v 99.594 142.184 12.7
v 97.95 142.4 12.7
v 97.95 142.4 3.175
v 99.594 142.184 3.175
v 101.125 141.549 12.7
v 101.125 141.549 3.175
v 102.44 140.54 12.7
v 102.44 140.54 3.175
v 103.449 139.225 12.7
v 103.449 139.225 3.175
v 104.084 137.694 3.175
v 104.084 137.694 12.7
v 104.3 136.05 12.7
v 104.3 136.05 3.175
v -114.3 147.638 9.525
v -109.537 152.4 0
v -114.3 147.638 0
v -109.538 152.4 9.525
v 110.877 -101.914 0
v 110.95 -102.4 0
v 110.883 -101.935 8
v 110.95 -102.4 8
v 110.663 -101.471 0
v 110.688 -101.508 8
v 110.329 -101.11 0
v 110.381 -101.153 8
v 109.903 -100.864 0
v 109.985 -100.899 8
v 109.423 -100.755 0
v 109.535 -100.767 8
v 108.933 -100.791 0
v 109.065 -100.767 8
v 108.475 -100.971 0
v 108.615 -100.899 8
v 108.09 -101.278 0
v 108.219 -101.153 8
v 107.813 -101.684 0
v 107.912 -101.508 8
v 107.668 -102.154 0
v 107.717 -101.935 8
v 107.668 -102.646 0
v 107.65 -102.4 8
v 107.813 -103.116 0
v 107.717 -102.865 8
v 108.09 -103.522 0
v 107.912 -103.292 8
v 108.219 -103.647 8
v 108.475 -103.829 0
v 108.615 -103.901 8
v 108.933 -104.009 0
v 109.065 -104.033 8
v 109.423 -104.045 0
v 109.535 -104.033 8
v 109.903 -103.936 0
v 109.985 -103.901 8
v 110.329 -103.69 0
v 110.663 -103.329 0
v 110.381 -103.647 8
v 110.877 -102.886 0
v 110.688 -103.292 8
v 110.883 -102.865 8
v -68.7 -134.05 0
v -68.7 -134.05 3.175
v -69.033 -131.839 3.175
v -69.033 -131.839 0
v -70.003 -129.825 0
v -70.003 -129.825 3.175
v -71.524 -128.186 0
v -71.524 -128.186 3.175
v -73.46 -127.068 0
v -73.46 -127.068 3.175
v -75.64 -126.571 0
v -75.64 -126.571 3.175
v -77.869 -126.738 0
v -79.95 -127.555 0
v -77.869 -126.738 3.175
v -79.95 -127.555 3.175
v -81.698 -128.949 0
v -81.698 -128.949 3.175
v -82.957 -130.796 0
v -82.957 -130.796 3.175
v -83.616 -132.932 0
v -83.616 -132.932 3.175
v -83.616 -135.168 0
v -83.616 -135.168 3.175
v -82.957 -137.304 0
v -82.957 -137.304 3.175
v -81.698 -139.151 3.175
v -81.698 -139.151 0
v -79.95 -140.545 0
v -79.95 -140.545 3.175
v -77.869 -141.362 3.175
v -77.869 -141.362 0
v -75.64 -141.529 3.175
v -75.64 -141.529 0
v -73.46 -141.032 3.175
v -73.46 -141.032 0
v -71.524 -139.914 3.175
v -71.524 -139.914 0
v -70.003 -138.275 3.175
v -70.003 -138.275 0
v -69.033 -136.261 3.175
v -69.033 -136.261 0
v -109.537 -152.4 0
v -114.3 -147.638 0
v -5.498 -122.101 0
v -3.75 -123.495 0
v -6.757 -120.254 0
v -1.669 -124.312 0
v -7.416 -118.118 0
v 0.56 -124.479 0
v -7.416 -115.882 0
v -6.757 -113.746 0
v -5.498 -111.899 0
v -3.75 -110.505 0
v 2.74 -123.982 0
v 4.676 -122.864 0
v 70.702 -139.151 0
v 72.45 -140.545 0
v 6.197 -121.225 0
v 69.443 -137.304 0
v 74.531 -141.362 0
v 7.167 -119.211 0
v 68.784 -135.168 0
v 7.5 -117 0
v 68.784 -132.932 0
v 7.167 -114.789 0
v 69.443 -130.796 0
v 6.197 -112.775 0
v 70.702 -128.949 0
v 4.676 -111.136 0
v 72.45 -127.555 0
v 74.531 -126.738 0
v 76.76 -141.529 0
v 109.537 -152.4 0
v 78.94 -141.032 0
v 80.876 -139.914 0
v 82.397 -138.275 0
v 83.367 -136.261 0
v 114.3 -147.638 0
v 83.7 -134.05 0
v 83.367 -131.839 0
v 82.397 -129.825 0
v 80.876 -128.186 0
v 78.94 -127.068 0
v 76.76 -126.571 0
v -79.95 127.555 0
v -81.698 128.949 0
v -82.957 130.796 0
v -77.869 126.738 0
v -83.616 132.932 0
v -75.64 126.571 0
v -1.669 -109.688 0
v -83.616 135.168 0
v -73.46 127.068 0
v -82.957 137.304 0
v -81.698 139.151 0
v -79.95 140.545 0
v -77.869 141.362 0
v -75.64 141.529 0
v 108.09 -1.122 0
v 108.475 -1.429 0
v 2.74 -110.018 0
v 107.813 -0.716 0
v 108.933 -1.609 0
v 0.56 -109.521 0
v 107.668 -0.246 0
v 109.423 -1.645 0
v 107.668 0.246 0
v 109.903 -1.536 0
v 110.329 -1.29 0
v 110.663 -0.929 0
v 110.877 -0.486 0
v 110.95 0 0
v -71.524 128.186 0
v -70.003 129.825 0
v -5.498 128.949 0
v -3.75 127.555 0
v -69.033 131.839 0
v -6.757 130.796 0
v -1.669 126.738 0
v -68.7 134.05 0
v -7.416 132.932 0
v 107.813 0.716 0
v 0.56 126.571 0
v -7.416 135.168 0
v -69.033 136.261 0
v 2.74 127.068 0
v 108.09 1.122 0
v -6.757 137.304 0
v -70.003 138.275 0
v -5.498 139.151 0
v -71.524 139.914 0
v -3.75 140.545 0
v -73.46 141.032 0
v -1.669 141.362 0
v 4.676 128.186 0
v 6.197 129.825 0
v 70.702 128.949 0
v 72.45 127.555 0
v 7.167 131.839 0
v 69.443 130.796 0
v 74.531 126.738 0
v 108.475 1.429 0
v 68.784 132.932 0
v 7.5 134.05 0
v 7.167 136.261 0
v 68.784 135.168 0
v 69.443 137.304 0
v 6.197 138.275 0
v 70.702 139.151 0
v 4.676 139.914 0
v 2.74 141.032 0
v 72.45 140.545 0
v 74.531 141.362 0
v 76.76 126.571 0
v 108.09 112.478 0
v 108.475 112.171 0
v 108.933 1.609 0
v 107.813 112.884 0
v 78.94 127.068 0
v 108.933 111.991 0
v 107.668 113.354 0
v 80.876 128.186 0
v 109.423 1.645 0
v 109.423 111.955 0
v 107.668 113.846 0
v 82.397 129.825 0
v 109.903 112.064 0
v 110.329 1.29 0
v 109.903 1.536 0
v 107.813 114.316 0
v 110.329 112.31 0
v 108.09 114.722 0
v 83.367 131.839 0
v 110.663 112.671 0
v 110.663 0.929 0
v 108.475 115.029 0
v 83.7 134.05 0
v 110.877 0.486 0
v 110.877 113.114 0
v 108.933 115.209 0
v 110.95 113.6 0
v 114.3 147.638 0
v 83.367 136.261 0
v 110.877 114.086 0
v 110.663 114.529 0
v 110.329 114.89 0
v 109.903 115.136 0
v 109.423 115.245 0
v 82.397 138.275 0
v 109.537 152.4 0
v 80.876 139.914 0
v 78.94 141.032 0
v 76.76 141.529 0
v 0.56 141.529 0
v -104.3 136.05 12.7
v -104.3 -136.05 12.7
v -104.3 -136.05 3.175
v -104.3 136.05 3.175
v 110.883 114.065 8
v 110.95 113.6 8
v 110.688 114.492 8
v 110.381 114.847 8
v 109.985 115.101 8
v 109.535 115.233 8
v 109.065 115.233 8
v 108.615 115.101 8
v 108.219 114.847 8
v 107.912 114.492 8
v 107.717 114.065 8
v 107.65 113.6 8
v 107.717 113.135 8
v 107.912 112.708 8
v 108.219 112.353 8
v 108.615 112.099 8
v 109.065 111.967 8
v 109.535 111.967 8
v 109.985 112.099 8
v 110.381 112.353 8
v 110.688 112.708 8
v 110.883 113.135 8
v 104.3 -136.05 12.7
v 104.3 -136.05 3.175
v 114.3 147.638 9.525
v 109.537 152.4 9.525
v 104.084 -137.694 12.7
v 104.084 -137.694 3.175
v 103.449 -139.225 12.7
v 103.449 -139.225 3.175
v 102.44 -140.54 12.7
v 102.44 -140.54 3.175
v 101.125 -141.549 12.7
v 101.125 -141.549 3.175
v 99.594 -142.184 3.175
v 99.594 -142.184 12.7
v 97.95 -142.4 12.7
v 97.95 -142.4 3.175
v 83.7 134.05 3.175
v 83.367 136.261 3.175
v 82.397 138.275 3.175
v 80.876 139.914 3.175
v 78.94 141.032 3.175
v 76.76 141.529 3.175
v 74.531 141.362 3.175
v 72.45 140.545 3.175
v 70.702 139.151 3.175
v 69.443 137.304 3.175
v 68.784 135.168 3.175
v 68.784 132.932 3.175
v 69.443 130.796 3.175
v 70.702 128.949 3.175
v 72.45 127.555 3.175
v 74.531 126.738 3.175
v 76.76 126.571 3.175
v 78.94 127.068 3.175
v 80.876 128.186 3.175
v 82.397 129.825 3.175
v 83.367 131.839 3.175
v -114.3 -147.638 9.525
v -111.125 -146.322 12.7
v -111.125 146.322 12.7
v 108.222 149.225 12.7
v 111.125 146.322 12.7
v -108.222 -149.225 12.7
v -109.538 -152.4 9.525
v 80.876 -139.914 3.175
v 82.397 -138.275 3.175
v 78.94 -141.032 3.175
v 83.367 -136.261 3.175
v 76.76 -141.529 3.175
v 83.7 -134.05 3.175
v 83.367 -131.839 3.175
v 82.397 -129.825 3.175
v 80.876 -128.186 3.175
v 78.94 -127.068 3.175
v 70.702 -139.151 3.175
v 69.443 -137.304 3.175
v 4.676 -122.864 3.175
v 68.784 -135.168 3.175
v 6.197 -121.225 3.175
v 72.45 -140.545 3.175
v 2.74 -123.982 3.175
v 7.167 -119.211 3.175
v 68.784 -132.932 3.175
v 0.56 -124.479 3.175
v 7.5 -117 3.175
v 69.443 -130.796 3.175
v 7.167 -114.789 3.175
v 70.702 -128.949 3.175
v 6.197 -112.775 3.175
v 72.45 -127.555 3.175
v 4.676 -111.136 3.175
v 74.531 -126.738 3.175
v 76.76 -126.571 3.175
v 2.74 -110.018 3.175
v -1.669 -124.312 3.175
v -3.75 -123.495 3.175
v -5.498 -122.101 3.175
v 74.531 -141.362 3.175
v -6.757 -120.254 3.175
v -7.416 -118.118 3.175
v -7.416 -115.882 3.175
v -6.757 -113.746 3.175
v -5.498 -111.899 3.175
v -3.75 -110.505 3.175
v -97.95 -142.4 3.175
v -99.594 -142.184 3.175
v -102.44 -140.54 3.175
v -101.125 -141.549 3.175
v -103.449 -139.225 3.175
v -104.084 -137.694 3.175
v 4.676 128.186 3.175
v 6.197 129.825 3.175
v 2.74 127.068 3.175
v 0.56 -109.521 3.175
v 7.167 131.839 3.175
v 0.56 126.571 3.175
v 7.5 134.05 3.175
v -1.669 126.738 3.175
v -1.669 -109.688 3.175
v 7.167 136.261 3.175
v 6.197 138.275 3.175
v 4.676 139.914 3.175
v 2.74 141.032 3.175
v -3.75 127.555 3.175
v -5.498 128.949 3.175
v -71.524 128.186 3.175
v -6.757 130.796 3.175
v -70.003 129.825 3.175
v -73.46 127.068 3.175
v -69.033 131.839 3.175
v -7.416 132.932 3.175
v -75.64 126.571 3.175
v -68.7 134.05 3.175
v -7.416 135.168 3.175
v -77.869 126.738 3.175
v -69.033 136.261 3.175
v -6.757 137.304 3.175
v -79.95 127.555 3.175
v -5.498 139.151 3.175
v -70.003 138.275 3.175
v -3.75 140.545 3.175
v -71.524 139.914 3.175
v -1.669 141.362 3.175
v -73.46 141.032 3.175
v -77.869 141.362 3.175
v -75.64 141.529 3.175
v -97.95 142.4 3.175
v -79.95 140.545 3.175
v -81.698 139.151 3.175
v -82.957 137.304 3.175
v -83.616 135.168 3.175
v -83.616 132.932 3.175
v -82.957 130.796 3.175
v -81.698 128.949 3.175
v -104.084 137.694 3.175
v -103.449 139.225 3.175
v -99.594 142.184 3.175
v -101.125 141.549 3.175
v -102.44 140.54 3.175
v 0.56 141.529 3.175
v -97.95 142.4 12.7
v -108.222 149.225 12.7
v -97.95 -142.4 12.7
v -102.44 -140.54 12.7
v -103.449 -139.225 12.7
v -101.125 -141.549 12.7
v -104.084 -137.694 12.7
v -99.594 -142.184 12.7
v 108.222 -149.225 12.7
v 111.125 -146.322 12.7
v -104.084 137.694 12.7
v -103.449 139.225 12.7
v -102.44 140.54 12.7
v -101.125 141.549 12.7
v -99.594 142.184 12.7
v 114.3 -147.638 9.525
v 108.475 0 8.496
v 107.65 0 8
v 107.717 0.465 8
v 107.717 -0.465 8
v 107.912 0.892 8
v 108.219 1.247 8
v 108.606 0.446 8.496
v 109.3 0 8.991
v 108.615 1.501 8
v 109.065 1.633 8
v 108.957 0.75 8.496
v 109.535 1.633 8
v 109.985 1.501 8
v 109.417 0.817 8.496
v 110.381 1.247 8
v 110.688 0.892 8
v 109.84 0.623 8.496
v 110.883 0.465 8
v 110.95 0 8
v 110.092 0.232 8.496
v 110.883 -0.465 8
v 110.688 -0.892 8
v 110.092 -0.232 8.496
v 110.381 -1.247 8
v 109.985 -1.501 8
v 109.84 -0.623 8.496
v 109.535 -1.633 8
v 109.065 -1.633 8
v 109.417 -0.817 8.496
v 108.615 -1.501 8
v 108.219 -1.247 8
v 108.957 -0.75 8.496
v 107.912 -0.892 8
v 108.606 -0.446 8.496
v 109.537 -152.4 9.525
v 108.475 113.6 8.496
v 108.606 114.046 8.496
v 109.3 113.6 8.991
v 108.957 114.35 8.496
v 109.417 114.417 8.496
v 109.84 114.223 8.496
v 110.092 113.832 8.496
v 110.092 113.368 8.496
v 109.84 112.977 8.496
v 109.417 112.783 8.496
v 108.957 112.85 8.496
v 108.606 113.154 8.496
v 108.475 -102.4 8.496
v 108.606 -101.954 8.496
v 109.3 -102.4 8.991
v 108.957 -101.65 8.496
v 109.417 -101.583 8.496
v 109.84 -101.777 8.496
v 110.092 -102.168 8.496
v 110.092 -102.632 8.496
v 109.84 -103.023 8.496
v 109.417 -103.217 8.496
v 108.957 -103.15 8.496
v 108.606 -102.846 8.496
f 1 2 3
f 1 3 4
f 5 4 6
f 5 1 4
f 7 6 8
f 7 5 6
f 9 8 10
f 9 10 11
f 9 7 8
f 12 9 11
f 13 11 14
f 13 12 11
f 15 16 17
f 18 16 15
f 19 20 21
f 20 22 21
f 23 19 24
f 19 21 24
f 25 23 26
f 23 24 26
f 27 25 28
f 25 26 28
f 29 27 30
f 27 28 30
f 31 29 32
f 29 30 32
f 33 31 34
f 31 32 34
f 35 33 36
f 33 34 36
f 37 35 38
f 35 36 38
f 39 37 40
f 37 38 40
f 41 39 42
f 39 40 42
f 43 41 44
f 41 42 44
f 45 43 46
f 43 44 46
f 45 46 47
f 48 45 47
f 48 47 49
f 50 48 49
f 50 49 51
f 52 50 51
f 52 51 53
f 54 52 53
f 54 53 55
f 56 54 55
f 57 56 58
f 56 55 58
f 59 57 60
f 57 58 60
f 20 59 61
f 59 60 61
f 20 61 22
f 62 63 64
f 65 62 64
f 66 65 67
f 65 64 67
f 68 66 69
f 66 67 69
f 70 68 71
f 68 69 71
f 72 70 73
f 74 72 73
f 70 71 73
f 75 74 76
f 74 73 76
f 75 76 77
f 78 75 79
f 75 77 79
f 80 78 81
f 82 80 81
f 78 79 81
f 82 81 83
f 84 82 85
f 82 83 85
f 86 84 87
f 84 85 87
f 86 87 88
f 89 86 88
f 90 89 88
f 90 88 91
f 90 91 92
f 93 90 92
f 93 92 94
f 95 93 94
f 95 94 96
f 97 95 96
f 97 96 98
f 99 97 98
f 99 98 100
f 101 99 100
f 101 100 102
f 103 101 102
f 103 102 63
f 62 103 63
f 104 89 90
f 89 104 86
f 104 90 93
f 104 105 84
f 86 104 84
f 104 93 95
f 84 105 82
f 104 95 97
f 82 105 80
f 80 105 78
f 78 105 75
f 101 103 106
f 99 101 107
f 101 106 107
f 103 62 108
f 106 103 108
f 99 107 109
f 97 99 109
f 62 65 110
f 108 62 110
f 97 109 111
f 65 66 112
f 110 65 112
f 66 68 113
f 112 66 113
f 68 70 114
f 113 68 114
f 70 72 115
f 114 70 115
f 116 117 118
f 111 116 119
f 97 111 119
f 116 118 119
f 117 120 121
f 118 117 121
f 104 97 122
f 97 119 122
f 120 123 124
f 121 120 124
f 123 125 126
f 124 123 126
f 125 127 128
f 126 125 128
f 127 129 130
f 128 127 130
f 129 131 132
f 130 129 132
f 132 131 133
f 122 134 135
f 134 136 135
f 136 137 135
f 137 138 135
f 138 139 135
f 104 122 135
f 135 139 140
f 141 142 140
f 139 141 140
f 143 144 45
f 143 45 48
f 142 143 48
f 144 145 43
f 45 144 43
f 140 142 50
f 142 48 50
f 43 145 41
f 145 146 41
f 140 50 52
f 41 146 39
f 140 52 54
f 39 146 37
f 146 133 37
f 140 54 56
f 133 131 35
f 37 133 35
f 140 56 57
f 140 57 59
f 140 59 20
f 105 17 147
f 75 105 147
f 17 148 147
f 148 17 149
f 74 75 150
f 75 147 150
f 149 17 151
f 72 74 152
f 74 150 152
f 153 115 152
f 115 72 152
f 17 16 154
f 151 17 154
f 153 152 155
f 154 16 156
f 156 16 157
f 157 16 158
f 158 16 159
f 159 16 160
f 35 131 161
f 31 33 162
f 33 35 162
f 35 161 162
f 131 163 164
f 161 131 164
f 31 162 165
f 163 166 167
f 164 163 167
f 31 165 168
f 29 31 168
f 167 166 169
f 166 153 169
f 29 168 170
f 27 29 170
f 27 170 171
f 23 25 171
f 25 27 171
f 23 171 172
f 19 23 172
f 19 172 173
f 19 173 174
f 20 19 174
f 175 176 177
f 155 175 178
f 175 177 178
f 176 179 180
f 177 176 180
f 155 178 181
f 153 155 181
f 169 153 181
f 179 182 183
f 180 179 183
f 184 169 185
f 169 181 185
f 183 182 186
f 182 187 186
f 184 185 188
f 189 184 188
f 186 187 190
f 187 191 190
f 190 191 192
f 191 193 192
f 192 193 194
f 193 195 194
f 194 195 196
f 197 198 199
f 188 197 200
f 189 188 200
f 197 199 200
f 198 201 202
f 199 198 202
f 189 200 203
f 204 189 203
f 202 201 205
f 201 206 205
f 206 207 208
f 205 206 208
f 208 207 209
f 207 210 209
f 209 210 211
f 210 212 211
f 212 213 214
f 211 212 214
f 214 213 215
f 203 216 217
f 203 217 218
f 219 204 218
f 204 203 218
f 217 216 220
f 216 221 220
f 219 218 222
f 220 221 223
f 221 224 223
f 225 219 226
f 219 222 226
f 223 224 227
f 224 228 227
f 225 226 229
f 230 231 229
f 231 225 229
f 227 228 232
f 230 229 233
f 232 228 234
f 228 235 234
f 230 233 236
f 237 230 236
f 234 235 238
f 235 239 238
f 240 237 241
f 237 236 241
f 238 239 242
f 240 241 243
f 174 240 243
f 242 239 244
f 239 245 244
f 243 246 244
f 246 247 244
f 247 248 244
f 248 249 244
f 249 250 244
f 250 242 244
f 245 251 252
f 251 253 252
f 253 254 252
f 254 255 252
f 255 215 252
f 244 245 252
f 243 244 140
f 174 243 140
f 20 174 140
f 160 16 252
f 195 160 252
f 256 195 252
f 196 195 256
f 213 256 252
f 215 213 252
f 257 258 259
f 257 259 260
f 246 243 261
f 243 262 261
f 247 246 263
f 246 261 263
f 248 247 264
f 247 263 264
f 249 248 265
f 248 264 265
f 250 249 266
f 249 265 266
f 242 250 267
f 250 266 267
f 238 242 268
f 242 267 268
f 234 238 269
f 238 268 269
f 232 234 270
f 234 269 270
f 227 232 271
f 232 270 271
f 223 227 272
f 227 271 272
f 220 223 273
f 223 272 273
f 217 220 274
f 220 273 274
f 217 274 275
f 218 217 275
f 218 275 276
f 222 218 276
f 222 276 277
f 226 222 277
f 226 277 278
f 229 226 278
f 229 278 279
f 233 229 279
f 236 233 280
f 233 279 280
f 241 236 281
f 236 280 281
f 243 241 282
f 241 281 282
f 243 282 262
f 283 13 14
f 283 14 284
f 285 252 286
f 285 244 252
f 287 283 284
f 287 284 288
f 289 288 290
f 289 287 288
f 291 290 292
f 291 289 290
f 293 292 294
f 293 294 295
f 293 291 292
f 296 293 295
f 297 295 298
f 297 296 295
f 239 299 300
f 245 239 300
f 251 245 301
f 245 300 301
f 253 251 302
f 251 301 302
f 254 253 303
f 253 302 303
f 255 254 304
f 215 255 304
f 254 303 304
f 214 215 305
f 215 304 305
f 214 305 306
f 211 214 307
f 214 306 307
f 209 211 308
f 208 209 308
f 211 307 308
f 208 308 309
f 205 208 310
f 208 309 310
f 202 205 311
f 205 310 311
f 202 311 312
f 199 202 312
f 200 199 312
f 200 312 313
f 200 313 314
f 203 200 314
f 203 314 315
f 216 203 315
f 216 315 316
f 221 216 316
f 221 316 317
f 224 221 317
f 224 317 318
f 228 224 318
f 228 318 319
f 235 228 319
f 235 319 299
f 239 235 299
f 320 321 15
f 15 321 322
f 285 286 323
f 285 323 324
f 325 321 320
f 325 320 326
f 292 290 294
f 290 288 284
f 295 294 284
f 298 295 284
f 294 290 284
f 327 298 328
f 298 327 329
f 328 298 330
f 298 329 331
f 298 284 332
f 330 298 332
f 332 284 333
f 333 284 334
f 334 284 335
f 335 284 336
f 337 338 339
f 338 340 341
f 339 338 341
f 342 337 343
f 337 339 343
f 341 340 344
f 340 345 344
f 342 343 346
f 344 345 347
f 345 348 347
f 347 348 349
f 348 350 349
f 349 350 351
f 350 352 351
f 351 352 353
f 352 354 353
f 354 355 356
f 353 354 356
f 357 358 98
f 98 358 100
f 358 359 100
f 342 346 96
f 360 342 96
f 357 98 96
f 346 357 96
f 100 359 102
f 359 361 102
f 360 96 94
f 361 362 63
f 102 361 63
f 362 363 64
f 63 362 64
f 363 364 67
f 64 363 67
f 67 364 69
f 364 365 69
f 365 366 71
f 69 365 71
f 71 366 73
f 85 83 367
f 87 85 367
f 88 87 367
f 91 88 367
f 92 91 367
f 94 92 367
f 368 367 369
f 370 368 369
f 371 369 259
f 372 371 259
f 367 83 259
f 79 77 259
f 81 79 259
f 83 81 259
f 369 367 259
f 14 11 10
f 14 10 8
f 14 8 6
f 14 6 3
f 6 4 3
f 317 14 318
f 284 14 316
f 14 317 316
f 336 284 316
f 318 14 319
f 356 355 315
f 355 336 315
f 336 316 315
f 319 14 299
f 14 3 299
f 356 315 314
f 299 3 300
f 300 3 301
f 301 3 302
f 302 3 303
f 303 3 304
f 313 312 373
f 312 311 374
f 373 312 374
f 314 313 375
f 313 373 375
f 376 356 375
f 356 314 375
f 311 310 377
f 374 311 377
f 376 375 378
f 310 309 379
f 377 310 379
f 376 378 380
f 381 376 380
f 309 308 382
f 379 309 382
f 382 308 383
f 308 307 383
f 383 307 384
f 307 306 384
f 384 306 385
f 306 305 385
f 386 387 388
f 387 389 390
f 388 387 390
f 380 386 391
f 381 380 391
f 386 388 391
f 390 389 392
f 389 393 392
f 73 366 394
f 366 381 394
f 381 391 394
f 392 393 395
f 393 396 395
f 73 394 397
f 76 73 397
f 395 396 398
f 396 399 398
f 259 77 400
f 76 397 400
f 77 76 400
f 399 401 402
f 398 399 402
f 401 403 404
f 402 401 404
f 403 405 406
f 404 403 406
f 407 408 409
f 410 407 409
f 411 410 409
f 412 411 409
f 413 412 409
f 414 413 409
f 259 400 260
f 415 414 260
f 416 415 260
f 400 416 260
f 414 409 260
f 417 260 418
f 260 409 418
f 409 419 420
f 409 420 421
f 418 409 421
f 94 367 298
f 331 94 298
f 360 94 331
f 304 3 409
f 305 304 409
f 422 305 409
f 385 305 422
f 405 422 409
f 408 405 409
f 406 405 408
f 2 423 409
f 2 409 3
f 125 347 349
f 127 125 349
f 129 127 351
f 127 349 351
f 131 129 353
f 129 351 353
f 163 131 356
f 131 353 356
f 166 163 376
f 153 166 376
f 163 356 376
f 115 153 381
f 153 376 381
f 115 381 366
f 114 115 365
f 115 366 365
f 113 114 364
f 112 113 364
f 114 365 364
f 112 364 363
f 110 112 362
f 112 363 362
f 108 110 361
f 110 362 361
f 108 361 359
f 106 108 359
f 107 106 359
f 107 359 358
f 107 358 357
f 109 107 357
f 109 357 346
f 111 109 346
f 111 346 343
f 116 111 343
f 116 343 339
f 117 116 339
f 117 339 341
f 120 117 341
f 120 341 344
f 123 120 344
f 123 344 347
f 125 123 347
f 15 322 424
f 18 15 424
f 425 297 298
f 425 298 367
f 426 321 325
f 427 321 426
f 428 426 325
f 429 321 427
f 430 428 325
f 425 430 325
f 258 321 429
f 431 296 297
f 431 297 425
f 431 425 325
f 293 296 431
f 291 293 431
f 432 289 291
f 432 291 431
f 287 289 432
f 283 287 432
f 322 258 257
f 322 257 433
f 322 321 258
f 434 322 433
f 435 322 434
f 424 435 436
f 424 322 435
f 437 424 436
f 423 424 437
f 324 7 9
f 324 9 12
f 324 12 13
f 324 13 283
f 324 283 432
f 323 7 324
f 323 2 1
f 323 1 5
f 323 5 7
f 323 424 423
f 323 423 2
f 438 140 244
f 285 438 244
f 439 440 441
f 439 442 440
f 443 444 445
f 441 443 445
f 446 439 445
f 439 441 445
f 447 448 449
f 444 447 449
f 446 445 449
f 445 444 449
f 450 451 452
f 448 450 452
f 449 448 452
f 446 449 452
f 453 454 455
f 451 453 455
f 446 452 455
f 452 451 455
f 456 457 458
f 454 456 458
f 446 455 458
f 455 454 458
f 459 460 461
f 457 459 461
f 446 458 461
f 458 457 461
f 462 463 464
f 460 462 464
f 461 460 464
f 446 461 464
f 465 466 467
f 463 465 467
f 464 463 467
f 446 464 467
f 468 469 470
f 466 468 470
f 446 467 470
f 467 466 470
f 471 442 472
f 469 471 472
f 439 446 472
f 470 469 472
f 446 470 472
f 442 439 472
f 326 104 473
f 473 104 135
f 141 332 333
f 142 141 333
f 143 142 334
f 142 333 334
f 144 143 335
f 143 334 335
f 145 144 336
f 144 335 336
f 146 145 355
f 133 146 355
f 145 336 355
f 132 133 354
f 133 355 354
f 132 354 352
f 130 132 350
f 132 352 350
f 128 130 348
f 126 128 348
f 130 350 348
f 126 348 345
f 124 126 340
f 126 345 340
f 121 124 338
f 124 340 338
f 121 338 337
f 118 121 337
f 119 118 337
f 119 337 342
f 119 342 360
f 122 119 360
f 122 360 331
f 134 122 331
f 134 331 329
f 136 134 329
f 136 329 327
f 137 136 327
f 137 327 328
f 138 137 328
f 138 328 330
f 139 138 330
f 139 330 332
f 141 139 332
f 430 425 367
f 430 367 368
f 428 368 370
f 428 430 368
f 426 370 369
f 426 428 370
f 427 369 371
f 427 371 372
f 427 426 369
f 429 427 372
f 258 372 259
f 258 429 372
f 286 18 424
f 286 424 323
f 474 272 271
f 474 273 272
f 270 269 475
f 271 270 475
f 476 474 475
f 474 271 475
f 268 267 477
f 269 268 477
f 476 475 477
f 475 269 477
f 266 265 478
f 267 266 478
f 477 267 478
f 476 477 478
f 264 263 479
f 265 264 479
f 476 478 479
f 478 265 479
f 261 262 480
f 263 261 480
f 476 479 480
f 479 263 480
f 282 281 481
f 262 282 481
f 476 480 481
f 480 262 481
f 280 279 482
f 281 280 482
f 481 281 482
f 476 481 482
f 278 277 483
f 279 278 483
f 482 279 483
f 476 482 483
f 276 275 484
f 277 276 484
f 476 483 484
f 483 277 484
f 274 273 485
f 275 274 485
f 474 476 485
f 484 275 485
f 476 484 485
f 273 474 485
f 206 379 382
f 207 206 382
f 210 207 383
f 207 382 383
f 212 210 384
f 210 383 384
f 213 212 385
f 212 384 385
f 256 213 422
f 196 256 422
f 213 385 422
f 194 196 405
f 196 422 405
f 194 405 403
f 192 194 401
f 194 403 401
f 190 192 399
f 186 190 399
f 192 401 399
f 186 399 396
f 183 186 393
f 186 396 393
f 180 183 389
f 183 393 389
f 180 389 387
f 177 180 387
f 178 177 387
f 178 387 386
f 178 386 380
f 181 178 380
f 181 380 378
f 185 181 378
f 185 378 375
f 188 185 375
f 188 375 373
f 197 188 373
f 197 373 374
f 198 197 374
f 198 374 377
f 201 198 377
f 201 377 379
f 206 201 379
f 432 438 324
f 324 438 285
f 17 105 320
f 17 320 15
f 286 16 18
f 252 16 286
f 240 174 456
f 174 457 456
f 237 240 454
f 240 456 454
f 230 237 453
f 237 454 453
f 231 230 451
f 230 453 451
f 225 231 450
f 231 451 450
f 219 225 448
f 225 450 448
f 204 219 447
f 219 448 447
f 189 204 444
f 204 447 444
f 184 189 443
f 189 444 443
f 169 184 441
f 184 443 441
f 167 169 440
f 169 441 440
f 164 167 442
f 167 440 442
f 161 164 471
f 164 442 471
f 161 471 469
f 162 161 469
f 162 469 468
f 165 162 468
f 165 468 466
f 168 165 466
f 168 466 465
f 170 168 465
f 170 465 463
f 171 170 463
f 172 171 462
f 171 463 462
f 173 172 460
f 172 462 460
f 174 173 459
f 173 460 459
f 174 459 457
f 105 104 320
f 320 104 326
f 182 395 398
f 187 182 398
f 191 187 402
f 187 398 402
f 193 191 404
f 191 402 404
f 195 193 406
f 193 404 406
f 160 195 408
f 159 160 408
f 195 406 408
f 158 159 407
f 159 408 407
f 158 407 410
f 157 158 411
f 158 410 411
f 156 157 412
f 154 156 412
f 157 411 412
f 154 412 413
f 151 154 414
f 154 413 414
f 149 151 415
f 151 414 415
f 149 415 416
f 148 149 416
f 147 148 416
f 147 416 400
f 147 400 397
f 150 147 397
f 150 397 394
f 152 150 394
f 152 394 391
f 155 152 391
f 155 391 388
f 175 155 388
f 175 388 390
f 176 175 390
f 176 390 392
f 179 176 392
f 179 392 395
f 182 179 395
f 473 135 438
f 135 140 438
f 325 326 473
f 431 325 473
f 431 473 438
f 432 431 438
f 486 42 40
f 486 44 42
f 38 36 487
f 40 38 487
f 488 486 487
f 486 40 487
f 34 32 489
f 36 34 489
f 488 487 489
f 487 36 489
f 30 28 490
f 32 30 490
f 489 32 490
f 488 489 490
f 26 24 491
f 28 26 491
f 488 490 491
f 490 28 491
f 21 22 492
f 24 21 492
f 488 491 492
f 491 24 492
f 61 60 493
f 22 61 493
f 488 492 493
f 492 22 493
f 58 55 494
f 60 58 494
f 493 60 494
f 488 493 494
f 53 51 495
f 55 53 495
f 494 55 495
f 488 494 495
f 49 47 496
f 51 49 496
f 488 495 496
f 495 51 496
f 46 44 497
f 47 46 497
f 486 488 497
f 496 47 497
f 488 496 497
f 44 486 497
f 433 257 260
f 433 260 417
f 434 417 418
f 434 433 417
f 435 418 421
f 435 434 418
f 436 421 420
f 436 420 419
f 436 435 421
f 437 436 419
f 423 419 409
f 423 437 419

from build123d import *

# Parameters (mm, degrees)
SKETCH1_W                 = 228.6
SKETCH1_H                 = 304.8
BOSS_EXTRUDE1_DEPTH       = 12.7
CUT_EXTRUDE1_DEPTH        = 9.525
SKETCH4_R                 = 7.5
CUT_EXTRUDE2_DEPTH        = 4.175
M4X0_7_TAPPED_HOLE1_D     = 3.3
M4X0_7_TAPPED_HOLE1_DEPTH = 8
M4X0_7_TAPPED_HOLE1_TIP   = 0.991420021
CHAMFER1_SIZE             = 4.7625
CHAMFER2_SIZE             = 3.175


with BuildPart() as part:
    # Sketch1 → Boss-Extrude1 (new body)
    with BuildSketch(Plane.XY):
        Rectangle(SKETCH1_W, SKETCH1_H)
    extrude(amount=BOSS_EXTRUDE1_DEPTH)

    # Sketch2 → Cut-Extrude1 (cut)
    with BuildSketch(Plane.XY.offset(12.7)):
        with BuildLine():
            Line((97.95, -142.4), (-97.95, -142.4))
            ThreePointArc((-97.95, -142.4), (-102.440128061, -140.540128061), (-104.3, -136.05))
            Line((-104.3, -136.05), (-104.3, 136.05))
            ThreePointArc((-104.3, 136.05), (-102.440128061, 140.540128061), (-97.95, 142.4))
            Line((-97.95, 142.4), (97.95, 142.4))
            ThreePointArc((97.95, 142.4), (102.440128061, 140.540128061), (104.3, 136.05))
            Line((104.3, 136.05), (104.3, -136.05))
            ThreePointArc((104.3, -136.05), (102.440128061, -140.540128061), (97.95, -142.4))
        make_face()
    extrude(amount=-CUT_EXTRUDE1_DEPTH, mode=Mode.SUBTRACT)

    # Sketch4 → Cut-Extrude2 (cut, through all)
    with BuildSketch(Plane.XY.offset(3.175)):
        with Locations((-76.2, 134.05)):
            Circle(SKETCH4_R)
        with Locations((76.2, 134.05)):
            Circle(SKETCH4_R)
        with Locations((-76.2, -134.05)):
            Circle(SKETCH4_R)
        with Locations((76.2, -134.05)):
            Circle(SKETCH4_R)
        with Locations((0, 134.05)):
            Circle(SKETCH4_R)
        with Locations((0, -117)):
            Circle(SKETCH4_R)
    extrude(amount=-CUT_EXTRUDE2_DEPTH, mode=Mode.SUBTRACT)

    # M4x0.7 Tapped Hole1
    with Locations(Plane(origin=(0, 0, 0), x_dir=(-1, 0, 0), z_dir=(0, 0, -1))):
        with Locations((-109.3, -102.4), (-109.3, 0), (-109.3, 113.6)):
            Hole(M4X0_7_TAPPED_HOLE1_D / 2, depth=M4X0_7_TAPPED_HOLE1_DEPTH)
            with Locations((0, 0, -(M4X0_7_TAPPED_HOLE1_DEPTH + M4X0_7_TAPPED_HOLE1_TIP / 2))):  # 118° drill point
                Cone(0, M4X0_7_TAPPED_HOLE1_D / 2, M4X0_7_TAPPED_HOLE1_TIP, mode=Mode.SUBTRACT)

    # Chamfer1
    chamfer1_edges = [part.edges().sort_by_distance(p)[0] for p in [
        (-114.3, 152.4, 6.35),
        (114.3, 152.4, 6.35),
        (114.3, -152.4, 6.35),
        (-114.3, -152.4, 6.35),
    ]]
    chamfer(chamfer1_edges, length=CHAMFER1_SIZE)

    # Chamfer2
    chamfer2_edges = [part.edges().sort_by_distance(p)[0] for p in [
        (0, -152.4, 12.7),
        (-114.3, 0, 12.7),
        (114.3, 0, 12.7),
        (0, 152.4, 12.7),
        (111.91875, 150.01875, 12.7),
        (-111.91875, 150.01875, 12.7),
        (111.91875, -150.01875, 12.7),
        (-111.91875, -150.01875, 12.7),
    ]]
    chamfer(chamfer2_edges, length=CHAMFER2_SIZE)


solid = part.part
